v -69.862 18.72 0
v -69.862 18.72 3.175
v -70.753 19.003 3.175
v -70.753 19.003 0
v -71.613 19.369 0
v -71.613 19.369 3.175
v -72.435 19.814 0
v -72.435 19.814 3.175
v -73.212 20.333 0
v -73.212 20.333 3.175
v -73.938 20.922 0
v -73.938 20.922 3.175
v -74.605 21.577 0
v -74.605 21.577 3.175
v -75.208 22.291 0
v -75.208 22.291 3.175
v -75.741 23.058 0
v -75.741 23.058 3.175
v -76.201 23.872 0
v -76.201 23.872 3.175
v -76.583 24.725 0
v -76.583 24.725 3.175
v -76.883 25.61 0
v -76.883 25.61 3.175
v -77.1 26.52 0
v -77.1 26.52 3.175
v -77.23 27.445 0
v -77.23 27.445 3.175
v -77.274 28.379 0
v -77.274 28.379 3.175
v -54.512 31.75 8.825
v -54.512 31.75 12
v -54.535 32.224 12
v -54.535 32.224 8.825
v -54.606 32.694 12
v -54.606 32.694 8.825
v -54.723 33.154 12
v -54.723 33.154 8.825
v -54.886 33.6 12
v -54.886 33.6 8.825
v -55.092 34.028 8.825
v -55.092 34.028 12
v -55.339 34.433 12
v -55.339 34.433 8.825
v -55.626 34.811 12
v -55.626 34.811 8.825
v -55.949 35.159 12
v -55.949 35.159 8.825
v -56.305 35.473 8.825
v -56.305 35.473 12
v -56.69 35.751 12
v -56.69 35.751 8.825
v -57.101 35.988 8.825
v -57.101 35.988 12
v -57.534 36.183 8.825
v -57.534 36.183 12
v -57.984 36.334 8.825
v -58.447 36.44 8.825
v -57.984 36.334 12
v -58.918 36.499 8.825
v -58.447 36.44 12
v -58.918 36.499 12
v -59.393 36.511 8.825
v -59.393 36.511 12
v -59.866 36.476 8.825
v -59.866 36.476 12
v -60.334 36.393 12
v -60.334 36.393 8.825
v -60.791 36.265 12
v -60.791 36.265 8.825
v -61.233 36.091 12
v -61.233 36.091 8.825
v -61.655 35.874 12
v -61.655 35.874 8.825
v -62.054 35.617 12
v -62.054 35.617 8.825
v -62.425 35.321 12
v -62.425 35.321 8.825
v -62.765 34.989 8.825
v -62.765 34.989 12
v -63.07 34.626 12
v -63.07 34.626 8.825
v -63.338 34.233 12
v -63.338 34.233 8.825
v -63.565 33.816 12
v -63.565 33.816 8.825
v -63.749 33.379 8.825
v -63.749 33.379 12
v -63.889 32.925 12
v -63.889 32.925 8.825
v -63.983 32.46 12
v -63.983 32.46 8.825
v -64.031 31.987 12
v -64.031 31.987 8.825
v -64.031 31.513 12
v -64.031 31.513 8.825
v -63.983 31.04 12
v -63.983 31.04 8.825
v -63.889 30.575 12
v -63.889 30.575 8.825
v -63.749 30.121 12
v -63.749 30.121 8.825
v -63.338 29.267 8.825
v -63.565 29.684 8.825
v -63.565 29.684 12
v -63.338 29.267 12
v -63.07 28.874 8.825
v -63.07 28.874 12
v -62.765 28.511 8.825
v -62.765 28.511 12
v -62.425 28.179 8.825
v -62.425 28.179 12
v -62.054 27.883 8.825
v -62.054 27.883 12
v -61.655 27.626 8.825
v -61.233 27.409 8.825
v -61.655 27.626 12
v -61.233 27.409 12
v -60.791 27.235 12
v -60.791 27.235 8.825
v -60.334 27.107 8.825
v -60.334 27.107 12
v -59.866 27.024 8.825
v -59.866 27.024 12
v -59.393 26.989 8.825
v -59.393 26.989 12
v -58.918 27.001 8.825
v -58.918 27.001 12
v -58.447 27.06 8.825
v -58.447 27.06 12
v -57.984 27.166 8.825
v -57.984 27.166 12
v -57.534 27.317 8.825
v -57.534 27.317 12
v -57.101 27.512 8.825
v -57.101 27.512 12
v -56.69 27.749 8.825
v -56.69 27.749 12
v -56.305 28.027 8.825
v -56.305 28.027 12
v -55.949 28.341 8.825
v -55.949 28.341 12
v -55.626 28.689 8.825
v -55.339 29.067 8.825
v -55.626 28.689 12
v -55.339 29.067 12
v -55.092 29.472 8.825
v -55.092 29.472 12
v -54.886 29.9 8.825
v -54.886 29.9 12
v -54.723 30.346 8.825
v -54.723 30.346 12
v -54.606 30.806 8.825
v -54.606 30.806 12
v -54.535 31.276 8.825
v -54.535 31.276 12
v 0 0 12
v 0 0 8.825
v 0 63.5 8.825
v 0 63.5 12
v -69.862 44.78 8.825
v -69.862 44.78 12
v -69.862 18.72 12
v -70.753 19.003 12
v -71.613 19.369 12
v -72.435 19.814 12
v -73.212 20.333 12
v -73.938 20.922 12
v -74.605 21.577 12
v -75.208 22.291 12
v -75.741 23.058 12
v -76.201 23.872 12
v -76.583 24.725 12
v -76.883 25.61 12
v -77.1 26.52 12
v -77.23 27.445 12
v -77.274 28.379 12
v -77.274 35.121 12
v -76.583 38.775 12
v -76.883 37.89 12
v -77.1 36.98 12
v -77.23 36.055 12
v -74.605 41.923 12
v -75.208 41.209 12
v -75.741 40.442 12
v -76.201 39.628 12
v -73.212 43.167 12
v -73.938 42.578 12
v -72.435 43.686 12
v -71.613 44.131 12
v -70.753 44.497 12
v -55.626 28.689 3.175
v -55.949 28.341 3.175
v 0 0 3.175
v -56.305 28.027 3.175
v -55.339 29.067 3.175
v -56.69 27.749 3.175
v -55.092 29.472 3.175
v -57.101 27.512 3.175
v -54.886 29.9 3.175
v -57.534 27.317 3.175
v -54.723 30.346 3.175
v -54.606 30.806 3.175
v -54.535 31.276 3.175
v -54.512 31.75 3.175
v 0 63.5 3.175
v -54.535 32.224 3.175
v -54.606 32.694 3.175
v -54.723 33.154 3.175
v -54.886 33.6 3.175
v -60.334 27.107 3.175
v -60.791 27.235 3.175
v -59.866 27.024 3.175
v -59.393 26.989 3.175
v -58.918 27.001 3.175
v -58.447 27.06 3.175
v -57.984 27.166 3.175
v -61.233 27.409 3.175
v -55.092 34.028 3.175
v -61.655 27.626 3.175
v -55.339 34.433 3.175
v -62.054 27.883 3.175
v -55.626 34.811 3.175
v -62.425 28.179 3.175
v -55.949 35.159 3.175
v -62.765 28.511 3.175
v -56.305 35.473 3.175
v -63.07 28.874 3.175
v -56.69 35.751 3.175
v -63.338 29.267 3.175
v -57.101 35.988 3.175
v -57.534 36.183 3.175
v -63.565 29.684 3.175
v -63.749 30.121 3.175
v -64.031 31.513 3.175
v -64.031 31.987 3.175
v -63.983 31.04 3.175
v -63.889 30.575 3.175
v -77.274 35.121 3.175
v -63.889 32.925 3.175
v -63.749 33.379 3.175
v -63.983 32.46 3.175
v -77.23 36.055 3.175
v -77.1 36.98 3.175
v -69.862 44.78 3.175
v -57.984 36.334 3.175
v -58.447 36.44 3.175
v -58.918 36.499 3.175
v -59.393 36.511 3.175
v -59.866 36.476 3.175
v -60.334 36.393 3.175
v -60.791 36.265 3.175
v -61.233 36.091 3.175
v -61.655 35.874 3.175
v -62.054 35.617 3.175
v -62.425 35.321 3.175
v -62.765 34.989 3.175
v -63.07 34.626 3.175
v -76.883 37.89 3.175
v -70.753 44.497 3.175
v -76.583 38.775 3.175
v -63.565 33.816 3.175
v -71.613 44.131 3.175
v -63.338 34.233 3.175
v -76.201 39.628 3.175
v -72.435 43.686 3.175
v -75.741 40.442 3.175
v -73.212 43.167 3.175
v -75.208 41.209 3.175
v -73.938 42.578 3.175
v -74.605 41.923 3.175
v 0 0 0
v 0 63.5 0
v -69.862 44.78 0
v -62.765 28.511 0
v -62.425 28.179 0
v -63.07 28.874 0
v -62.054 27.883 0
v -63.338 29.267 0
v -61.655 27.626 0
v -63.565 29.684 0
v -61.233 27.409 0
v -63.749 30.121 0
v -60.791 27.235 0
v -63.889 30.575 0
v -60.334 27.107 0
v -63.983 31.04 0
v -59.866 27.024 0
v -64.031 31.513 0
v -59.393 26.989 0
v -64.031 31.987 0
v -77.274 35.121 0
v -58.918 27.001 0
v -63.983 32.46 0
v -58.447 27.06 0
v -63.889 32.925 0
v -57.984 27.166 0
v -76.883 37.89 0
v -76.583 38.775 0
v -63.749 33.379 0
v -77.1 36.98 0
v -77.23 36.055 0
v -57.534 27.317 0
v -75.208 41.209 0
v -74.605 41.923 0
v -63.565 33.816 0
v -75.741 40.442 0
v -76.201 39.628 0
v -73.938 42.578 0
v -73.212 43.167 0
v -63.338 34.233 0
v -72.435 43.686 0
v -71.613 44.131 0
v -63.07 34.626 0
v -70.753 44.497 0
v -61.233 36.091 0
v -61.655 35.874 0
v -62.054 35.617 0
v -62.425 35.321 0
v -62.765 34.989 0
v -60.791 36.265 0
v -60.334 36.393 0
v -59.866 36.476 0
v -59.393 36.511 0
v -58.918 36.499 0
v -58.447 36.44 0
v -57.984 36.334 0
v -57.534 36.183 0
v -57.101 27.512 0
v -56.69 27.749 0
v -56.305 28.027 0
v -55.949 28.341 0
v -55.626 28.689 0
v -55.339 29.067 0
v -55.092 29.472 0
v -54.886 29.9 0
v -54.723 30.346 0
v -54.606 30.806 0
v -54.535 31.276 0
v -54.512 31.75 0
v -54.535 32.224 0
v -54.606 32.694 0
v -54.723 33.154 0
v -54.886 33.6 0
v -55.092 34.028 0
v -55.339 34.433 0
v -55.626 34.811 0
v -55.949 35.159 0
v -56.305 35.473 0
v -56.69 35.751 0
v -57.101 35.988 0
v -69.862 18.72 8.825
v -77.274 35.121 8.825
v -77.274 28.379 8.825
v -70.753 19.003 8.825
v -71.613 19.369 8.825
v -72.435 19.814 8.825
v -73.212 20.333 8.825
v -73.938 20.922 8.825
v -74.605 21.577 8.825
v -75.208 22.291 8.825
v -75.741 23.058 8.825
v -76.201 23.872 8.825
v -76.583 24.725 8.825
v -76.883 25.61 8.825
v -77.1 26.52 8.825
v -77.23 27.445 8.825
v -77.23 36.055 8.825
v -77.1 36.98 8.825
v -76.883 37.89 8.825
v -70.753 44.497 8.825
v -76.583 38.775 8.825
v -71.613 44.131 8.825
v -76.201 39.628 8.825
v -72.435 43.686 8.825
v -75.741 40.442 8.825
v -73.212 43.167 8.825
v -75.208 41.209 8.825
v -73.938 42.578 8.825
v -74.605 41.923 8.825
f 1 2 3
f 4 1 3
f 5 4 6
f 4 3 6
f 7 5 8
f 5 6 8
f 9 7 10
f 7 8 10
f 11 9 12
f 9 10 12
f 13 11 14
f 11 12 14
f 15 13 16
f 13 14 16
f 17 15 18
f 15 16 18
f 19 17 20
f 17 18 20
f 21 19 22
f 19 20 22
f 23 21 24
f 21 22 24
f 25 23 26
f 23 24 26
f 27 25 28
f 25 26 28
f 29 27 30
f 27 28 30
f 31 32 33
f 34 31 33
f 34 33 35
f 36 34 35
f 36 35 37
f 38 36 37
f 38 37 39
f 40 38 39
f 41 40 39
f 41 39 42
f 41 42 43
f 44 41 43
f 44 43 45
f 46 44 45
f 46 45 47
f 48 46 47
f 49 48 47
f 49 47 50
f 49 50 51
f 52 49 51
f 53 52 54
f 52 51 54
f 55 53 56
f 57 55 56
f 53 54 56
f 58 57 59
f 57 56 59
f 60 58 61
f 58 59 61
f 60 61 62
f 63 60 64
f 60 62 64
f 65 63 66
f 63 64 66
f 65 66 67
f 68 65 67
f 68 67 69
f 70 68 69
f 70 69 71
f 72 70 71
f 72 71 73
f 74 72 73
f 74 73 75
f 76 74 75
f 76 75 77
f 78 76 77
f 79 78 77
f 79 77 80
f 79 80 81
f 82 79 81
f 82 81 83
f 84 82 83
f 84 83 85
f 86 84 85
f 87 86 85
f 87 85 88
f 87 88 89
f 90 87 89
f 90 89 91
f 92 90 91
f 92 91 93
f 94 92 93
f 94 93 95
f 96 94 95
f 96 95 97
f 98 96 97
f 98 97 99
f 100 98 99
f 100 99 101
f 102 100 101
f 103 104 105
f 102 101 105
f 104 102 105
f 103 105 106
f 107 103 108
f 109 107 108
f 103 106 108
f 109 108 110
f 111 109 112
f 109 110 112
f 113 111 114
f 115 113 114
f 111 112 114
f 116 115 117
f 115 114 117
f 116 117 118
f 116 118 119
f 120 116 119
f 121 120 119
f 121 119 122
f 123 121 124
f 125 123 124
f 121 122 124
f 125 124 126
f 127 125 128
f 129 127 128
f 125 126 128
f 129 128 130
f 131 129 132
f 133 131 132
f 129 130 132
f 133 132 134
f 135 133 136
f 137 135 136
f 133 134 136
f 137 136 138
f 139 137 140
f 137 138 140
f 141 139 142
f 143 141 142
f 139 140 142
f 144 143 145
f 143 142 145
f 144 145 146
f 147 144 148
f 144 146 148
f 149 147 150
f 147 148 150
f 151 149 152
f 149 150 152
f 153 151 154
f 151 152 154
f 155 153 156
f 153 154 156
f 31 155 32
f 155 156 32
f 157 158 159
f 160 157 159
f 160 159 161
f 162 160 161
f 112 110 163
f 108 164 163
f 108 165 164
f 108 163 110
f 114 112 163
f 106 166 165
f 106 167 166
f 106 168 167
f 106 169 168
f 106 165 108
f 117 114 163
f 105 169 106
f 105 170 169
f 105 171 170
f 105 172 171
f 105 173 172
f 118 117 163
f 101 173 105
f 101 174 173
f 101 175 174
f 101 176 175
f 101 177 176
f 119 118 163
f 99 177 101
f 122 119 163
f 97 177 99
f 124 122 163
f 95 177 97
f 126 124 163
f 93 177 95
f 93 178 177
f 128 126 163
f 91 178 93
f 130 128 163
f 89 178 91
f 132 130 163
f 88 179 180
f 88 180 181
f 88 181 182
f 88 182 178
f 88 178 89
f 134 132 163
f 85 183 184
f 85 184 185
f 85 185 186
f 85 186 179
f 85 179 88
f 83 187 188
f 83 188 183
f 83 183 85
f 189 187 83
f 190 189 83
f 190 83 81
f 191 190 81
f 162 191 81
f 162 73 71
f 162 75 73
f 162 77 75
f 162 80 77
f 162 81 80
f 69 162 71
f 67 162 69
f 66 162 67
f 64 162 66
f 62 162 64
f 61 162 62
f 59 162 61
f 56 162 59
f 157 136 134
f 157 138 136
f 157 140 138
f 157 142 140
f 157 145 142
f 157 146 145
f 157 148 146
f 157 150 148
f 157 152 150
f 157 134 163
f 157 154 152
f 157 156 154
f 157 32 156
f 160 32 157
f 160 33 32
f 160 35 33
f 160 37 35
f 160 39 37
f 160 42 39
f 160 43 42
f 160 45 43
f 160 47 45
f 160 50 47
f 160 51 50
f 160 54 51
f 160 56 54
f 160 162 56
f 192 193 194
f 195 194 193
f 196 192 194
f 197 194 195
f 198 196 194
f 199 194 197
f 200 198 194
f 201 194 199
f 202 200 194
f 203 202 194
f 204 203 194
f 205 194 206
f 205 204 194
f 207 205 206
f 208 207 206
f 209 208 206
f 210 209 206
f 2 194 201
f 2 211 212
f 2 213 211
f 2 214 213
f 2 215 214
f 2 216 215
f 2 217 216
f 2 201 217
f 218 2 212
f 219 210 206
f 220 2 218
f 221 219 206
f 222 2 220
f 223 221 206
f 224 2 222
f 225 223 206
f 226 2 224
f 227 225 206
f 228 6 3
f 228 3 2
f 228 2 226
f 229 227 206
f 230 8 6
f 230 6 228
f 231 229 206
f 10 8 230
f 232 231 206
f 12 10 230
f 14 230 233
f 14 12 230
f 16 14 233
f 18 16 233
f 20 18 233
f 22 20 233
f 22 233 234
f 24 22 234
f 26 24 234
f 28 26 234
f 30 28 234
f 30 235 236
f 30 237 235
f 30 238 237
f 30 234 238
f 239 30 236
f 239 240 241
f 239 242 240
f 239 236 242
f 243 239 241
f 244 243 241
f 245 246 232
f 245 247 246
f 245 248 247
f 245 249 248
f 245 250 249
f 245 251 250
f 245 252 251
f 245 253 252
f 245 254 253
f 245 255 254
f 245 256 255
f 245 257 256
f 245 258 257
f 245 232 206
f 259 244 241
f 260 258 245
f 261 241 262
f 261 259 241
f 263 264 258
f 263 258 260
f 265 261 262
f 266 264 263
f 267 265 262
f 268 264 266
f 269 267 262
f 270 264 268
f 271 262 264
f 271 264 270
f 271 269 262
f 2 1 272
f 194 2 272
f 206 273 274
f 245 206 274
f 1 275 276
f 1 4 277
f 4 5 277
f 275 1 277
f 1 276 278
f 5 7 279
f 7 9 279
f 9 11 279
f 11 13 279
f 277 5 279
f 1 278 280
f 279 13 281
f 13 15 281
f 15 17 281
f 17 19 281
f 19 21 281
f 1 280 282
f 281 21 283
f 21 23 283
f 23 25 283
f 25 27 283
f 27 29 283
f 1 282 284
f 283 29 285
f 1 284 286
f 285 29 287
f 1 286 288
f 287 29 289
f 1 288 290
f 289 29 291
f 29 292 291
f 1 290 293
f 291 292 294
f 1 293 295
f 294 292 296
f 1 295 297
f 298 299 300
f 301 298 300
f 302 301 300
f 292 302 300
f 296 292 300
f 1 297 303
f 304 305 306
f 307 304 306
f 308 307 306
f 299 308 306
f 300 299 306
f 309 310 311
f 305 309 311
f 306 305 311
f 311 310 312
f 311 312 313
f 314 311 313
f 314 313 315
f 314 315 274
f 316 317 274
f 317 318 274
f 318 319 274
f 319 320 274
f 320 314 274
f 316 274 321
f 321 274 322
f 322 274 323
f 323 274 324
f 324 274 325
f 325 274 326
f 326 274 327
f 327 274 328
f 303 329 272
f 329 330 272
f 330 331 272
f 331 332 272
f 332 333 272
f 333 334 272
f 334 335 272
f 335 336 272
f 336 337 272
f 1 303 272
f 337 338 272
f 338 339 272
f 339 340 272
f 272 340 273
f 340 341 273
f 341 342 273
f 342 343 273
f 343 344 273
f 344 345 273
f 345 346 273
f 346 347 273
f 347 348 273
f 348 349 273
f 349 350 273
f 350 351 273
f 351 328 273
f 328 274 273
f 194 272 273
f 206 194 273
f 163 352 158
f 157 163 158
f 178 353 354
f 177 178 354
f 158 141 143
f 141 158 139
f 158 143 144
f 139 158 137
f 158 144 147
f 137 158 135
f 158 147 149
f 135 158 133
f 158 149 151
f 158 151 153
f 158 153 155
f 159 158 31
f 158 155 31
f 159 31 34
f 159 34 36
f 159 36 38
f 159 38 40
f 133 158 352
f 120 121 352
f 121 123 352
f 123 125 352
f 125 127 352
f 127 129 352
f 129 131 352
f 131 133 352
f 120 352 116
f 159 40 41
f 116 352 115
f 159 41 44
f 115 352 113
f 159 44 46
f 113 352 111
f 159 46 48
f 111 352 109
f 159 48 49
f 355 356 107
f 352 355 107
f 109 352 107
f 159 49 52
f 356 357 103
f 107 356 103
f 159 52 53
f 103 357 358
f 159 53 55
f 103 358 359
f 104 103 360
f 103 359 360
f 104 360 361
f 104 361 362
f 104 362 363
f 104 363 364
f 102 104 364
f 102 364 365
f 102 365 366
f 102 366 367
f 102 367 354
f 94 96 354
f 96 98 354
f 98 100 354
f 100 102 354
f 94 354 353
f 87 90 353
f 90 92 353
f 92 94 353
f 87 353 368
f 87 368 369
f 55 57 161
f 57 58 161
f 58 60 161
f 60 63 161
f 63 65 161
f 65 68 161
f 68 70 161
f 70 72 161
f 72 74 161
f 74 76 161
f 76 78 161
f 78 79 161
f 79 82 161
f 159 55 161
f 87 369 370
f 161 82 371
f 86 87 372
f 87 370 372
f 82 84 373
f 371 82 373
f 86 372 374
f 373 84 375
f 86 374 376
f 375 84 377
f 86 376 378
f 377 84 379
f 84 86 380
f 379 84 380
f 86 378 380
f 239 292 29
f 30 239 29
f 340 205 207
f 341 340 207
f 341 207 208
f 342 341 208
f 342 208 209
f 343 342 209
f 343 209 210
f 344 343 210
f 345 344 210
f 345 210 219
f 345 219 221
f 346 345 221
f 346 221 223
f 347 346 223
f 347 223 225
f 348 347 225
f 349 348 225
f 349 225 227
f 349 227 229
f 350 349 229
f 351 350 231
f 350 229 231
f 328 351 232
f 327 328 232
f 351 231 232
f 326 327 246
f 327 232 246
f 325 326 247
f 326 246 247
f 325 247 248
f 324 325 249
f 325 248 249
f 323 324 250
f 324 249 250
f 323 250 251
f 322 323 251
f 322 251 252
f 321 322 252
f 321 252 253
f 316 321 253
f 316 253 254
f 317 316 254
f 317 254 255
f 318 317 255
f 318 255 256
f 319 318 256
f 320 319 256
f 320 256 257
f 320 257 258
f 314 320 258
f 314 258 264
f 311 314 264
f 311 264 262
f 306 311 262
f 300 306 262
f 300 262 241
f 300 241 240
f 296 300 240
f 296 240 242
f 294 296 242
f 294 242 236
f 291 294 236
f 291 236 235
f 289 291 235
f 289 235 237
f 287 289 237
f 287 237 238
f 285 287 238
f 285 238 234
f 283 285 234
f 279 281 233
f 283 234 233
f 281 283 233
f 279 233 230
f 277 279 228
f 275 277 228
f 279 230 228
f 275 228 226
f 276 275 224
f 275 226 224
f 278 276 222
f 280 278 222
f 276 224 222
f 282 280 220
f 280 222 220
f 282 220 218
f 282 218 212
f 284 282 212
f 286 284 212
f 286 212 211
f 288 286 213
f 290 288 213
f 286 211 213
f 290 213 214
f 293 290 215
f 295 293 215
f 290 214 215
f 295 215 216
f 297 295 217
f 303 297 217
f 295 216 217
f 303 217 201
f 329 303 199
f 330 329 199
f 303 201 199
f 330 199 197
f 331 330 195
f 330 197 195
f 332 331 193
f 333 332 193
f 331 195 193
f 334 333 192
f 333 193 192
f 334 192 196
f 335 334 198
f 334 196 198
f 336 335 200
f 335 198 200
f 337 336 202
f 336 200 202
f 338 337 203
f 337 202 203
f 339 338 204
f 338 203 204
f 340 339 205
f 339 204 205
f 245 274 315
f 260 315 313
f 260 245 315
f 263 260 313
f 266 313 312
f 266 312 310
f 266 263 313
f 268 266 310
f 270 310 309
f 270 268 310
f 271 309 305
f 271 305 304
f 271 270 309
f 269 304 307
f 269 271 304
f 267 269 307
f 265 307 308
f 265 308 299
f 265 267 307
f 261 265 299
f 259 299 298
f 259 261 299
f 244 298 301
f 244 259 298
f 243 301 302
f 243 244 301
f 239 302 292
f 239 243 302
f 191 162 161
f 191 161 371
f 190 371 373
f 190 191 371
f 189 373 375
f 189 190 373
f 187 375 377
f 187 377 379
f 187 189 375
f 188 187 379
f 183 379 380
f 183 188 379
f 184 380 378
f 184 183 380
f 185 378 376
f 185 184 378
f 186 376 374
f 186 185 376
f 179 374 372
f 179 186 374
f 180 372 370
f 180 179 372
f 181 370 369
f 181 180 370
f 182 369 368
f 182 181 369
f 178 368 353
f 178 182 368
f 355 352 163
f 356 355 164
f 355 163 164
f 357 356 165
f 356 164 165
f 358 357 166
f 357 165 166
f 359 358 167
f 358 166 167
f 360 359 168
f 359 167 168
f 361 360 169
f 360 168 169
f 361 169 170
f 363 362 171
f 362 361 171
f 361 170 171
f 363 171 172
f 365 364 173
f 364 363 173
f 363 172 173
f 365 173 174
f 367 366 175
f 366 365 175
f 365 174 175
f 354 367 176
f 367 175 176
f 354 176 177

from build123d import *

# Parameters (mm, degrees)
SALIENTE_EXTRUIR1_DEPTH = 12
CROQUIS2_R              = 4.7625
CORTAR_EXTRUIR1_DEPTH   = 12
REDONDEO1_R             = 10
CROQUIS3_W              = 5.65
CROQUIS3_H              = 93.399024574
CORTAR_EXTRUIR2_DEPTH   = 100


with BuildPart() as part:
    # Croquis1 → Saliente-Extruir1 (new body)
    with BuildSketch(Plane.XY):
        Polygon((0, 0), (0, 63.5), (-77.274066103, 42.794476392), (-77.274066103, 20.705523608), align=None)
    extrude(amount=SALIENTE_EXTRUIR1_DEPTH)

    # Croquis2 → Cortar-Extruir1 (cut)
    with BuildSketch(Plane.XY.offset(12)):
        with Locations((-59.274066103, 31.75)):
            Circle(CROQUIS2_R)
    extrude(amount=-CORTAR_EXTRUIR1_DEPTH, mode=Mode.SUBTRACT)

    # Redondeo1
    redondeo1_edges = [part.edges().sort_by_distance(p)[0] for p in [
        (-77.274066103, 20.705523608, 6),
        (-77.274066103, 42.794476392, 6),
    ]]
    fillet(redondeo1_edges, radius=REDONDEO1_R)

    # Croquis3 → Cortar-Extruir2 (cut)
    with BuildSketch(Plane.ZY.offset(77.274066103)):
        with Locations((6, 31.75)):
            Rectangle(CROQUIS3_W, CROQUIS3_H)
    extrude(amount=-CORTAR_EXTRUIR2_DEPTH, mode=Mode.SUBTRACT)


solid = part.part
